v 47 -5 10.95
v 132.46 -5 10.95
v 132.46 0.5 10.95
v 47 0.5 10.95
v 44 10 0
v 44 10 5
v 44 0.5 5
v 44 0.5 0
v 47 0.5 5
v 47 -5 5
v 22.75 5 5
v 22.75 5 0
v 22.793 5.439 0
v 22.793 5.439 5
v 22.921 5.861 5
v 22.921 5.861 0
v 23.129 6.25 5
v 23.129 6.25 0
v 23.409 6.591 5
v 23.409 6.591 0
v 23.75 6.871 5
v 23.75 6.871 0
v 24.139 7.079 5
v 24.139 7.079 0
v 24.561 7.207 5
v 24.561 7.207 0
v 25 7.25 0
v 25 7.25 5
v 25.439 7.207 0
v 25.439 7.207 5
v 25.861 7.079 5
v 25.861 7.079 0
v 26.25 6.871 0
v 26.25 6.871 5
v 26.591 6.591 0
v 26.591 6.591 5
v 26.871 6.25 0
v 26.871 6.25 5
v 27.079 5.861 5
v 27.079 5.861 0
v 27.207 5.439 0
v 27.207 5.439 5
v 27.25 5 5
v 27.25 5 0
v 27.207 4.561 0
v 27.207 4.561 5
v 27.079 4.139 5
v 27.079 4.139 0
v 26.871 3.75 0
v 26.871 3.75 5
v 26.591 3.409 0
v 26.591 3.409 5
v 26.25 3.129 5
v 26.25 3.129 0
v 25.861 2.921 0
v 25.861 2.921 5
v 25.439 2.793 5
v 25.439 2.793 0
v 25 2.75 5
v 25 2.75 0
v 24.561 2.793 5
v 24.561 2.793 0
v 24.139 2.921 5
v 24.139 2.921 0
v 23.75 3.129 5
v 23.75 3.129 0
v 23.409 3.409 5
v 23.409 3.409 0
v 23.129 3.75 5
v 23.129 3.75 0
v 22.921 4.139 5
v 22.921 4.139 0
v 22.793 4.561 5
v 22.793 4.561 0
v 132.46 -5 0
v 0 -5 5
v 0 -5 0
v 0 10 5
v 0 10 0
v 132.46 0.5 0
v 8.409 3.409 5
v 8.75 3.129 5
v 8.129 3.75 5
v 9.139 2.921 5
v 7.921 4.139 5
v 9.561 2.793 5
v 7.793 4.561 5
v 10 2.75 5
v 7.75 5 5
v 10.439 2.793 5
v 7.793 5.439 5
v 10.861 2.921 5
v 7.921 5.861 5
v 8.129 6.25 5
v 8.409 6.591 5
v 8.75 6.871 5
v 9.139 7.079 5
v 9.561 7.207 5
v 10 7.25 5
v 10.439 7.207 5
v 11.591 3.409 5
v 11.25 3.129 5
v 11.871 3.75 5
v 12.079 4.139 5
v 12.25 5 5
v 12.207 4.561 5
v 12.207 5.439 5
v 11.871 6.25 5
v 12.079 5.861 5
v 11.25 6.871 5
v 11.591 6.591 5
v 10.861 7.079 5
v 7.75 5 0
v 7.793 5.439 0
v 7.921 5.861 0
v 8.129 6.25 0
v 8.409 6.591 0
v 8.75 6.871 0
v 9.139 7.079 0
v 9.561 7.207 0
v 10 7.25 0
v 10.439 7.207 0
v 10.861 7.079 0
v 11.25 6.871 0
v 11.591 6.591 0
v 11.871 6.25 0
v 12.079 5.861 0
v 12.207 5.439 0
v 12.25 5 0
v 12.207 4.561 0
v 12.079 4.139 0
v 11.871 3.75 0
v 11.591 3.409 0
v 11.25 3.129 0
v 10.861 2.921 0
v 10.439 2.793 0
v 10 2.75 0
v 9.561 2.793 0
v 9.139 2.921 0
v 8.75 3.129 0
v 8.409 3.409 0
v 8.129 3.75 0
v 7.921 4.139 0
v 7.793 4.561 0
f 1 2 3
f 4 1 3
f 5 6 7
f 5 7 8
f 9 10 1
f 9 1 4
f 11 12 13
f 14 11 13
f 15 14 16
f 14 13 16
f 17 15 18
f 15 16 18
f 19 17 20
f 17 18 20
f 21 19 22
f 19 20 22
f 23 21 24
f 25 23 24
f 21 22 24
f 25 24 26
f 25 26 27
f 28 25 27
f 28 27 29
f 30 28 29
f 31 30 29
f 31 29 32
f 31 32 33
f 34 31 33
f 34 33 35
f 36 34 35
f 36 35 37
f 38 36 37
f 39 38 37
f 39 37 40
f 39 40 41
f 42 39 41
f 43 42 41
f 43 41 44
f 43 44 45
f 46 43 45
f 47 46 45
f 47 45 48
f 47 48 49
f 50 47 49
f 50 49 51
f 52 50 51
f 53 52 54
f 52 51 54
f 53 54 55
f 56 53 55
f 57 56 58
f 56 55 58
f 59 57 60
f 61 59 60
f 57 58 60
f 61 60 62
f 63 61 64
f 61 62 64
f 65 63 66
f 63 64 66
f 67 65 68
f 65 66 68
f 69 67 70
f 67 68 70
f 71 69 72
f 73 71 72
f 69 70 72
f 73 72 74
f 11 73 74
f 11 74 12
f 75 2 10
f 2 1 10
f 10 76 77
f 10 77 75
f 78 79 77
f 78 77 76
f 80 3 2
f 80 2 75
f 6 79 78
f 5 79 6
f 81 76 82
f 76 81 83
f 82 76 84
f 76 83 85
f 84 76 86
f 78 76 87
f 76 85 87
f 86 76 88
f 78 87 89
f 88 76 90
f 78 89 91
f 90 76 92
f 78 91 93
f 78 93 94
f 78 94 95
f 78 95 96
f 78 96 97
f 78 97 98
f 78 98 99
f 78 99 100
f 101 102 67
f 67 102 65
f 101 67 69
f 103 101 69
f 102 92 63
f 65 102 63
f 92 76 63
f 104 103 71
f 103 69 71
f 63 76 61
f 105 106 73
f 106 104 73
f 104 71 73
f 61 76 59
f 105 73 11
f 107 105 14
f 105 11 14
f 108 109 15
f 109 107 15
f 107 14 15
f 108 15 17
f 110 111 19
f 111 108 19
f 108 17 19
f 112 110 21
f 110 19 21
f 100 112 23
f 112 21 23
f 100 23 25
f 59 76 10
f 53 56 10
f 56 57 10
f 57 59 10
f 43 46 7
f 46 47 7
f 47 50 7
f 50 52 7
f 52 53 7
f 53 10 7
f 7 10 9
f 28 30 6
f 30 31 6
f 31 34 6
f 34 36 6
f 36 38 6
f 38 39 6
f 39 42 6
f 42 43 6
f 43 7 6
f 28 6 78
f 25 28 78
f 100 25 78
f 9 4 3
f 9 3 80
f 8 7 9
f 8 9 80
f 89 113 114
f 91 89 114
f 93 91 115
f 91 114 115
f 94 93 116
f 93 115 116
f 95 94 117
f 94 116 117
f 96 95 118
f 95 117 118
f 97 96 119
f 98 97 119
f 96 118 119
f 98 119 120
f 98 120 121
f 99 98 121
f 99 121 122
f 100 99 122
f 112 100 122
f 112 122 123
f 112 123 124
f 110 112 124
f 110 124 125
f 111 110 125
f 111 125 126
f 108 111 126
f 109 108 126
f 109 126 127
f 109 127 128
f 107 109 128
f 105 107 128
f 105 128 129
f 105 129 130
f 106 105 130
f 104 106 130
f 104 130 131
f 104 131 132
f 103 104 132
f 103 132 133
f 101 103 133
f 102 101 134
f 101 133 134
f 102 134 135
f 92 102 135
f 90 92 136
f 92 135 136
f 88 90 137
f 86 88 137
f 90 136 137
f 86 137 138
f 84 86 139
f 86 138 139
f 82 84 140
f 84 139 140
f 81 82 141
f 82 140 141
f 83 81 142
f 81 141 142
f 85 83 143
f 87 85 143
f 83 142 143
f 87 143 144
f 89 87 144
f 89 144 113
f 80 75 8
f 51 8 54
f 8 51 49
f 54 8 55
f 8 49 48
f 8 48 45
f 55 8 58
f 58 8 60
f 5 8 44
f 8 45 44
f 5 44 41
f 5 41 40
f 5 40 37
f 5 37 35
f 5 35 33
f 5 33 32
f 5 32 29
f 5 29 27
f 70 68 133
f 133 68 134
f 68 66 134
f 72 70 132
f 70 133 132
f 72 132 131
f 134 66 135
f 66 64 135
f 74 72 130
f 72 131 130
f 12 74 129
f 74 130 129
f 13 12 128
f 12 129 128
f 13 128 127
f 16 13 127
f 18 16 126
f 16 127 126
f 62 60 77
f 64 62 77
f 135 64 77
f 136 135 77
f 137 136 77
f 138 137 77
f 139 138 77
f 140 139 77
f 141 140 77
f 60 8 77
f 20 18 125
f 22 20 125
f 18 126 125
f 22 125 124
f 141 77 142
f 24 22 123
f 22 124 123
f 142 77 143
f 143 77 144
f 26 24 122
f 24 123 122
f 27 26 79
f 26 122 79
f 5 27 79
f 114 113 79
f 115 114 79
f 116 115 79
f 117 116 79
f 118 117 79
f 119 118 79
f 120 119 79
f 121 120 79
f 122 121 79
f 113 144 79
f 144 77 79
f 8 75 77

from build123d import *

# Parameters (mm, degrees)
SKETCH_1_W          = 100
SKETCH_1_H          = 25
EXTRUDE_1_DEPTH     = 5
SKETCH_2_W          = 53
SKETCH_2_H          = 5
EXTRUDE_2_DEPTH     = 5
SKETCH_5_W          = 56
SKETCH_5_H          = 5
CUT_EXTRUDE_1_DEPTH = 10
SKETCH_6_W          = 5
SKETCH_6_H          = 5
EXTRUDE_3_DEPTH     = 47
SKETCH_7_W          = 56
SKETCH_7_H          = 5
CUT_EXTRUDE_2_DEPTH = 14.5
SKETCH_8_W          = 53
SKETCH_8_H          = 5.5
EXTRUDE_4_DEPTH     = 5.95
SKETCH_9_W          = 10.95
SKETCH_9_H          = 5.5
EXTRUDE_5_DEPTH     = 32.46
SKETCH_11_W         = 44
SKETCH_11_H         = 5
CUT_EXTRUDE_3_DEPTH = 15
SKETCH_12_R         = 2.25
CUT_EXTRUDE_4_DEPTH = 15


with BuildPart() as part:
    # 草图1 → 凸台-拉伸1 (new body)
    with BuildSketch(Plane.XY):
        with Locations((50, 12.5)):
            Rectangle(SKETCH_1_W, SKETCH_1_H)
    extrude(amount=EXTRUDE_1_DEPTH)

    # 草图2 → 凸台-拉伸2 (add)
    with BuildSketch(Plane.XZ):
        with Locations((73.5, 2.5)):
            Rectangle(SKETCH_2_W, SKETCH_2_H)
    extrude(amount=EXTRUDE_2_DEPTH)

    # 草图5 → 切除-拉伸1 (cut)
    with BuildSketch(Plane(origin=(0, 25, 0), x_dir=(1, 0, 0), z_dir=(0, 1, 0))):
        with Locations((72, -2.5)):
            Rectangle(SKETCH_5_W, SKETCH_5_H)
    extrude(amount=-CUT_EXTRUDE_1_DEPTH, mode=Mode.SUBTRACT)

    # 草图6 → 凸台-拉伸3 (add)
    with BuildSketch(Plane.ZY.offset(-47)):
        with Locations((2.5, -2.5)):
            Rectangle(SKETCH_6_W, SKETCH_6_H)
    extrude(amount=EXTRUDE_3_DEPTH)

    # 草图7 → 切除-拉伸2 (cut)
    with BuildSketch(Plane(origin=(0, 15, 0), x_dir=(1, 0, 0), z_dir=(0, 1, 0))):
        with Locations((72, -2.5)):
            Rectangle(SKETCH_7_W, SKETCH_7_H)
    extrude(amount=-CUT_EXTRUDE_2_DEPTH, mode=Mode.SUBTRACT)

    # 草图8 → 凸台-拉伸4 (add)
    with BuildSketch(Plane.XY.offset(5)):
        with Locations((73.5, -2.25)):
            Rectangle(SKETCH_8_W, SKETCH_8_H)
    extrude(amount=EXTRUDE_4_DEPTH)

    # 草图9 → 凸台-拉伸5 (add)
    with BuildSketch(Plane(origin=(100, 0, 0), x_dir=(0, 0, -1), z_dir=(1, 0, 0))):
        with Locations((-5.475, -2.25)):
            Rectangle(SKETCH_9_W, SKETCH_9_H)
    extrude(amount=EXTRUDE_5_DEPTH)

    # 草图11 → 切除-拉伸3 (cut)
    with BuildSketch(Plane(origin=(0, 25, 0), x_dir=(1, 0, 0), z_dir=(0, 1, 0))):
        with Locations((22, -2.5)):
            Rectangle(SKETCH_11_W, SKETCH_11_H)
    extrude(amount=-CUT_EXTRUDE_3_DEPTH, mode=Mode.SUBTRACT)

    # 草图12 → 切除-拉伸4 (cut)
    with BuildSketch(Plane(origin=(0, 0, 0), x_dir=(-1, 0, 0), z_dir=(0, 0, -1))):
        with Locations((-10, 5)):
            Circle(SKETCH_12_R)
        with Locations((-25, 5)):
            Circle(SKETCH_12_R)
    extrude(amount=-CUT_EXTRUDE_4_DEPTH, mode=Mode.SUBTRACT)


solid = part.part
